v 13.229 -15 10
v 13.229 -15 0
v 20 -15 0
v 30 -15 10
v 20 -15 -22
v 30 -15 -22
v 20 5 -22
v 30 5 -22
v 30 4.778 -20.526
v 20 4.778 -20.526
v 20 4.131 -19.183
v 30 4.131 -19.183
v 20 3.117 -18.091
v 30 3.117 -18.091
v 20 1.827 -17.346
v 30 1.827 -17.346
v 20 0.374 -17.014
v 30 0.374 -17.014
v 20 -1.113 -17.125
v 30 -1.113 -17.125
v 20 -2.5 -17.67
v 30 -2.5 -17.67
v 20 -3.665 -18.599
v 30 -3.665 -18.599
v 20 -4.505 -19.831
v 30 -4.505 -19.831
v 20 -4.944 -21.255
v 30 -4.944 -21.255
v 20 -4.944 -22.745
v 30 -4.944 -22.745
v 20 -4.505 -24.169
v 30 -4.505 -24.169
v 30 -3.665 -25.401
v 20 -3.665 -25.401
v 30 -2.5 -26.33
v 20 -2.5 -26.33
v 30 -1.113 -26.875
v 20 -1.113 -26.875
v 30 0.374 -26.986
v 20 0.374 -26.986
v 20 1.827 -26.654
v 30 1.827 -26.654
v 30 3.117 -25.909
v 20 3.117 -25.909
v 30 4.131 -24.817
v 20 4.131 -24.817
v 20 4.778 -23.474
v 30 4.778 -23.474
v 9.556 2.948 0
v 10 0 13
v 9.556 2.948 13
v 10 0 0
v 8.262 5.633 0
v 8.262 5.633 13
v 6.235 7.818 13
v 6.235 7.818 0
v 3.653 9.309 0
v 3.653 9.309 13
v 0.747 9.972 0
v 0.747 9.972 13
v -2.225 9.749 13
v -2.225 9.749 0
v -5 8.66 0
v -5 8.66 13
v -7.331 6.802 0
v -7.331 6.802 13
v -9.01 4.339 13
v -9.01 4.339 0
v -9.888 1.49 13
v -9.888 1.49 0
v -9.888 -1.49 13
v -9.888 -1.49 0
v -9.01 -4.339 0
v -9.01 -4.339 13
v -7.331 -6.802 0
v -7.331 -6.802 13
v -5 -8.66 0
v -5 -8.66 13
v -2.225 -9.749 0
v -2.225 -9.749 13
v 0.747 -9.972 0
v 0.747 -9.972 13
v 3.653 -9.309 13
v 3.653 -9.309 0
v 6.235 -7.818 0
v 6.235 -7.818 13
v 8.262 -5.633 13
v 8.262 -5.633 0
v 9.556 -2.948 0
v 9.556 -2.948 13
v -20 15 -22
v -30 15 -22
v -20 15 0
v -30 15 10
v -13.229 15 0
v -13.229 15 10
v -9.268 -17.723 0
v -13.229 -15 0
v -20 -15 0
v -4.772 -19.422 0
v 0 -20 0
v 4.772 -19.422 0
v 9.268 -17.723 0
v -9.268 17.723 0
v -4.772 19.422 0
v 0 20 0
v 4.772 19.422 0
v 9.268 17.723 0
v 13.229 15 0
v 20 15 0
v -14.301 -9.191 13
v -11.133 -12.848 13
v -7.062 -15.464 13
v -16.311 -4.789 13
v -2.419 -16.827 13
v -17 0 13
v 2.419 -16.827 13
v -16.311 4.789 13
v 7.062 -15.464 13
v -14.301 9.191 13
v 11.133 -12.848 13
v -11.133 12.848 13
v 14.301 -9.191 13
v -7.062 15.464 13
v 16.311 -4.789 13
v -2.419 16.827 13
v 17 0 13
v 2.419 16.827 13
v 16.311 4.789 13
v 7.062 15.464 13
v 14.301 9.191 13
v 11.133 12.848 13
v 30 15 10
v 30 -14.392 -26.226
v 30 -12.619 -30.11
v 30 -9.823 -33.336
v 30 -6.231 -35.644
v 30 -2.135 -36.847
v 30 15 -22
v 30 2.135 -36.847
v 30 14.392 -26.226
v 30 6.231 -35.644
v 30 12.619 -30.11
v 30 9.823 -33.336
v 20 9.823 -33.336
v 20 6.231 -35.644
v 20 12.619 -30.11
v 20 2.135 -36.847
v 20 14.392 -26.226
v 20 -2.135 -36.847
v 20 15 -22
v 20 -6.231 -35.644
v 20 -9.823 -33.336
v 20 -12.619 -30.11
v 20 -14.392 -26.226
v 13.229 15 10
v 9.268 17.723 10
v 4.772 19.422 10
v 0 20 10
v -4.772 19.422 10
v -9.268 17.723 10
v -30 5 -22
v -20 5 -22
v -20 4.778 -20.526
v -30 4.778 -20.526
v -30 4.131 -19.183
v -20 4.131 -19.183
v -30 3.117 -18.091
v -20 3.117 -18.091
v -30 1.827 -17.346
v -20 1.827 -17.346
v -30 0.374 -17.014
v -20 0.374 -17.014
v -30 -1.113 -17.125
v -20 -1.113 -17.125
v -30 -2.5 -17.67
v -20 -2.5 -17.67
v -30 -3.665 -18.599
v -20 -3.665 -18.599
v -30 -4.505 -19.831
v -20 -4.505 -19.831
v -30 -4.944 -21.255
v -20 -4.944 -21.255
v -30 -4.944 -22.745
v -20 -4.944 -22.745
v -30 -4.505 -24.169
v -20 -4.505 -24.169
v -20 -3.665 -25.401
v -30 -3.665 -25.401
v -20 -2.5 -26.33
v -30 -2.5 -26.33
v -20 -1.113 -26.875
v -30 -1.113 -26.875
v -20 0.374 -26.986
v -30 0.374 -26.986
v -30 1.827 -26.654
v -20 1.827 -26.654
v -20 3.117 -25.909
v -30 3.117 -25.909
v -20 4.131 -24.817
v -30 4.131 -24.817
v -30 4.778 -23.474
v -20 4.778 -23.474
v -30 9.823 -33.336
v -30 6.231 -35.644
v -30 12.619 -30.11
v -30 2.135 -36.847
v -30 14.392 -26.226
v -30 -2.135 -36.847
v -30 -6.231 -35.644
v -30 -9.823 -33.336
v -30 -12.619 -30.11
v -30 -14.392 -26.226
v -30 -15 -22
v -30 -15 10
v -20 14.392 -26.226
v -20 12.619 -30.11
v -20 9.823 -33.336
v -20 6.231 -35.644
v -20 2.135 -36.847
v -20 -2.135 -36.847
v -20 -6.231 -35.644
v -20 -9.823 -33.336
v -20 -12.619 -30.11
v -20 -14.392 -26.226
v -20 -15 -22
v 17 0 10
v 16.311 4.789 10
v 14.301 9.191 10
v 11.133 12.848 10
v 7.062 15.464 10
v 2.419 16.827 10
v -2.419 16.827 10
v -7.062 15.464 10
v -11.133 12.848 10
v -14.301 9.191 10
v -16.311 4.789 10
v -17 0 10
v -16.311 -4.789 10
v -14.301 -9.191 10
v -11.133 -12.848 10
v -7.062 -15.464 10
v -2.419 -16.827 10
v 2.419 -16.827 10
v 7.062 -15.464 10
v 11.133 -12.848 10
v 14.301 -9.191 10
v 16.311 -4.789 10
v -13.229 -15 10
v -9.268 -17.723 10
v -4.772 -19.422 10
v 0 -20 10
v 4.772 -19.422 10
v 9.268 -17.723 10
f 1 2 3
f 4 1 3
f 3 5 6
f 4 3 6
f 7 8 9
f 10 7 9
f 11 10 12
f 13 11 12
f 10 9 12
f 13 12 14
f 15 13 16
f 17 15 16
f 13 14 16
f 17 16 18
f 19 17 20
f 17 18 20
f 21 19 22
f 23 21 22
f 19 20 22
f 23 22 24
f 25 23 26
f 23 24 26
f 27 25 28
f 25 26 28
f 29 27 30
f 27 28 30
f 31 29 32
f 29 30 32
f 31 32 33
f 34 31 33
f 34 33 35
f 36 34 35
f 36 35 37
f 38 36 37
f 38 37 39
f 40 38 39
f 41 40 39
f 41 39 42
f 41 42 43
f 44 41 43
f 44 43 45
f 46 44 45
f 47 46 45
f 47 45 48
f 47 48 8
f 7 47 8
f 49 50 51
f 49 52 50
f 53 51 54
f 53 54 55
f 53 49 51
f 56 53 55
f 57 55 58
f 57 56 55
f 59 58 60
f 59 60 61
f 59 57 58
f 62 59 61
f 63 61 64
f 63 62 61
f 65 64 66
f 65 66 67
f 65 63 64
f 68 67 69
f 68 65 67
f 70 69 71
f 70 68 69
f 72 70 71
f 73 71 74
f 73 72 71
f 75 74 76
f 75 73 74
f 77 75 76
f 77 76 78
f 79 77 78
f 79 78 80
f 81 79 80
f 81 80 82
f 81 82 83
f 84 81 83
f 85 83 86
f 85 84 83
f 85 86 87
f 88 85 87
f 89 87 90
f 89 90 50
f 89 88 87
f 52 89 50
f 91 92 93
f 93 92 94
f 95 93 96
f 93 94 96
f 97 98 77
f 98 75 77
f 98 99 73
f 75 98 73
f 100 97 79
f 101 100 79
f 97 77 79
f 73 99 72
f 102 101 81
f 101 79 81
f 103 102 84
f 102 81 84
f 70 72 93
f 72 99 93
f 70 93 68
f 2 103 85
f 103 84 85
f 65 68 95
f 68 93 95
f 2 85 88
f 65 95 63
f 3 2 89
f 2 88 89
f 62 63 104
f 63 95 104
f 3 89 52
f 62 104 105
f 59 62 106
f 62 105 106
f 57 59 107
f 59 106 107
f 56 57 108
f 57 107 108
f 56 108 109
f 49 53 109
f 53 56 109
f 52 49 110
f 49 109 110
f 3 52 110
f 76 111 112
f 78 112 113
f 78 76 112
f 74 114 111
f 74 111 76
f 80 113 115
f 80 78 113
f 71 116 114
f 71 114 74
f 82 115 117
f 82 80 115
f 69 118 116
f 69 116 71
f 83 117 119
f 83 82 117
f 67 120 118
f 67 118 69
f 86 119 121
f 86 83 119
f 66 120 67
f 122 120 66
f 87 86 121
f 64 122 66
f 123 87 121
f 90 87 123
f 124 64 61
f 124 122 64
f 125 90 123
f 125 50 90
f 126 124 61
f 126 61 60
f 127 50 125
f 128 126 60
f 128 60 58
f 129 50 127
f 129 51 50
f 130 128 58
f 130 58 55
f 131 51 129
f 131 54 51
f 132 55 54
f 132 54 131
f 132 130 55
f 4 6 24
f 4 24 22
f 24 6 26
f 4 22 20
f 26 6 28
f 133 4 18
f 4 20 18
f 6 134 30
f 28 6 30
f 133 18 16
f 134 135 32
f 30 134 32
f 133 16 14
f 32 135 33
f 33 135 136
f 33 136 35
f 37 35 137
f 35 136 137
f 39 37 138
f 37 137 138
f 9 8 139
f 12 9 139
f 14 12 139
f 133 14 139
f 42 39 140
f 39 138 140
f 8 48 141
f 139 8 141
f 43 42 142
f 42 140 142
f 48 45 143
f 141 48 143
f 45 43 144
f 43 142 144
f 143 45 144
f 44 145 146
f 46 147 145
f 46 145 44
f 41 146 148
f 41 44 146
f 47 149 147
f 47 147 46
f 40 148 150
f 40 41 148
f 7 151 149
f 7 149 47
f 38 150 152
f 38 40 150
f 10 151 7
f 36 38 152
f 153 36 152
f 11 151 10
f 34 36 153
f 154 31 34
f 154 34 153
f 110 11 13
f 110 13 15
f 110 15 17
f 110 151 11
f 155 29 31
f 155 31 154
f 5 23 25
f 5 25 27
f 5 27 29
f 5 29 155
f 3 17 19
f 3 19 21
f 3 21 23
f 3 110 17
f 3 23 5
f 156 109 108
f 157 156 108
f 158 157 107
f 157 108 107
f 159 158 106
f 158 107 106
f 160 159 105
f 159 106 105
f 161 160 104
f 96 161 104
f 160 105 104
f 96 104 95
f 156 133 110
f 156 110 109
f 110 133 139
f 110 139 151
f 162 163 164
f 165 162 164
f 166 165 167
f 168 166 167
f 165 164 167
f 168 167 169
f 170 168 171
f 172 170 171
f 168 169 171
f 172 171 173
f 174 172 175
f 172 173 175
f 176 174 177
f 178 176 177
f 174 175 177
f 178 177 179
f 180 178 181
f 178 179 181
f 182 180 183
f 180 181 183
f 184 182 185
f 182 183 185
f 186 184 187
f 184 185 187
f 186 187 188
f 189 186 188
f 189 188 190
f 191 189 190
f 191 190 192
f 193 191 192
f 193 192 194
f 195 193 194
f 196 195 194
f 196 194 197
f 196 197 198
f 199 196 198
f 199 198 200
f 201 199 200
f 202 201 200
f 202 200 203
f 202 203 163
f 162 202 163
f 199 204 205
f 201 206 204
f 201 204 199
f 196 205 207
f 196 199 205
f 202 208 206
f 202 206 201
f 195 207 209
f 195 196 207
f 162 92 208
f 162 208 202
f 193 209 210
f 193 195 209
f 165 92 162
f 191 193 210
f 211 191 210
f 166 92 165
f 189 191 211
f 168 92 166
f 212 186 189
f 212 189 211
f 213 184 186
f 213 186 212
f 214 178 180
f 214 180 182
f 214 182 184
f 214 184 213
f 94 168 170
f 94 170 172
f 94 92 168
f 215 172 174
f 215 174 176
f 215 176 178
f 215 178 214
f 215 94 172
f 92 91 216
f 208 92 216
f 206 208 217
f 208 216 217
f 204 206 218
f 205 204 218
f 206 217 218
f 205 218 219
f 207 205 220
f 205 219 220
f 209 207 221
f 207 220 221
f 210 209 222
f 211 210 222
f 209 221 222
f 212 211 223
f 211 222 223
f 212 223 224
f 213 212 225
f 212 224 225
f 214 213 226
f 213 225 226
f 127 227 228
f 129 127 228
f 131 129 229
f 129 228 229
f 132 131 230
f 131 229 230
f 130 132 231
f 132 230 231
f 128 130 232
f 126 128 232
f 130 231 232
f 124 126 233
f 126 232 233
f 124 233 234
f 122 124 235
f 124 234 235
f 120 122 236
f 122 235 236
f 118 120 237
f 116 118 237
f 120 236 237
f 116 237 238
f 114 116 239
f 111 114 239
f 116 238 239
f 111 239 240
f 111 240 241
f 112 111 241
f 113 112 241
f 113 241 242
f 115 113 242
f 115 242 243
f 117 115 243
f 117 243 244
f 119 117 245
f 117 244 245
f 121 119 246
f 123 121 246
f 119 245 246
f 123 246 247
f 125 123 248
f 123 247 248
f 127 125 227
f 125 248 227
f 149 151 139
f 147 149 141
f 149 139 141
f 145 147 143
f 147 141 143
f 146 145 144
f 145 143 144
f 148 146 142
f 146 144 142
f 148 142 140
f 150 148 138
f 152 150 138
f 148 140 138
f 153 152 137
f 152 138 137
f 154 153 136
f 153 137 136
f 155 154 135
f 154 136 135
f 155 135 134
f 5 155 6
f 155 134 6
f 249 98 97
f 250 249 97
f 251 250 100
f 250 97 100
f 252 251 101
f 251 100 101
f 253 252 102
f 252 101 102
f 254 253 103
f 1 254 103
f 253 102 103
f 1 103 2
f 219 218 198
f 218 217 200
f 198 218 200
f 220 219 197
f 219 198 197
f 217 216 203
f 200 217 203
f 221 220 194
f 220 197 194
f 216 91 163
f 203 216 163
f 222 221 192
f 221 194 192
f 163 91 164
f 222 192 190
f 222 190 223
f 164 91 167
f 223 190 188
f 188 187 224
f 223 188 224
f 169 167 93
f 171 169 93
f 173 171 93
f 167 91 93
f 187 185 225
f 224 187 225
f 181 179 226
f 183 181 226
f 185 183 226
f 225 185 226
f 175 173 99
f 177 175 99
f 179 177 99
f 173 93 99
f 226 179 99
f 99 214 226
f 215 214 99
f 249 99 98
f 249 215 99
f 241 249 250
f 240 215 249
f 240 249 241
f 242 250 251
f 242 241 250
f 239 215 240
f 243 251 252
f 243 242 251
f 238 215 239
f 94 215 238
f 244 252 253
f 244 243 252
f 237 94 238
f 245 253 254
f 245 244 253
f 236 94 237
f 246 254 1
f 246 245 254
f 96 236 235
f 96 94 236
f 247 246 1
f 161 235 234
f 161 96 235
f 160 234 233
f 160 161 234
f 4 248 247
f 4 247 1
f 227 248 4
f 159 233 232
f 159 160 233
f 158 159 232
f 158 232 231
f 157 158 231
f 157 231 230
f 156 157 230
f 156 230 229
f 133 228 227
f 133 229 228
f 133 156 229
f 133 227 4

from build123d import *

# Parameters (mm, degrees)
F0_R     = 10
F1_DEPTH = 10
F2_R     = 17
F2_R_2   = 10
F3_DEPTH = 3
F4_W     = 10
F4_H     = 30
F5_DEPTH = 37
F6_R     = 5
F7_DEPTH = 60.001


with BuildPart() as f1:
    # F0 (on Top) → F1 (new body)
    with BuildSketch(Plane.XY):
        with BuildLine():
            Line((30, -15), (30, 15))
            Line((30, 15), (13.2287565553, 15))
            ThreePointArc((13.2287565553, 15), (18.2287565553, 8.2287565553), (20, 0))
            ThreePointArc((20, 0), (18.2287565553, -8.2287565553), (13.2287565553, -15))
            Line((13.2287565553, -15), (30, -15))
        make_face()
        with BuildLine():
            ThreePointArc((20, 0), (18.2287565553, 8.2287565553), (13.2287565553, 15))
            Line((13.2287565553, 15), (-13.2287565553, 15))
            ThreePointArc((-13.2287565553, 15), (-20, 0), (-13.2287565553, -15))
            Line((-13.2287565553, -15), (13.2287565553, -15))
            ThreePointArc((13.2287565553, -15), (18.2287565553, -8.2287565553), (20, 0))
        make_face()
        Circle(F0_R, mode=Mode.SUBTRACT)
        with BuildLine():
            Line((-13.2287565553, 15), (13.2287565553, 15))
            ThreePointArc((13.2287565553, 15), (0, 20), (-13.2287565553, 15))
        make_face()
        with BuildLine():
            ThreePointArc((-13.2287565553, -15), (-20, 0), (-13.2287565553, 15))
            Line((-13.2287565553, 15), (-30, 15))
            Line((-30, 15), (-30, -15))
            Line((-30, -15), (-13.2287565553, -15))
        make_face()
        with BuildLine():
            ThreePointArc((-13.2287565553, -15), (0, -20), (13.2287565553, -15))
            Line((13.2287565553, -15), (-13.2287565553, -15))
        make_face()
    extrude(amount=F1_DEPTH)

    # F2 (on face) → F3 (join)
    with BuildSketch(Plane.XY.offset(10)):
        Circle(F2_R)
        Circle(F2_R_2, mode=Mode.SUBTRACT)
    extrude(amount=F3_DEPTH)

    # F4 (on face) → F5 (join)
    with BuildSketch(Plane(origin=(0, 0, 0), x_dir=(1, 0, 0), z_dir=(0, 0, -1))):
        with Locations((-25, 0)):
            Rectangle(F4_W, F4_H)
        with Locations((25, 0)):
            Rectangle(F4_W, F4_H)
    extrude(amount=F5_DEPTH)

    # F6 (on face) → F7 (cut, through all)
    with BuildSketch(Plane.YZ.offset(30)):
        with BuildLine():
            ThreePointArc((0, -37), (-10.6066017409, -32.6066016947), (-15, -21.9999999346))
            Line((-15, -21.9999999346), (-15, -37))
            Line((-15, -37), (0, -37))
        make_face()
        with BuildLine():
            Line((15, -37), (15, -22))
            ThreePointArc((15, -22), (10.6066017178, -32.6066017178), (0, -37))
            Line((0, -37), (15, -37))
        make_face()
        with Locations((0, -22)):
            Circle(F6_R)
    extrude(amount=-F7_DEPTH, mode=Mode.SUBTRACT)


solid = f1.part
